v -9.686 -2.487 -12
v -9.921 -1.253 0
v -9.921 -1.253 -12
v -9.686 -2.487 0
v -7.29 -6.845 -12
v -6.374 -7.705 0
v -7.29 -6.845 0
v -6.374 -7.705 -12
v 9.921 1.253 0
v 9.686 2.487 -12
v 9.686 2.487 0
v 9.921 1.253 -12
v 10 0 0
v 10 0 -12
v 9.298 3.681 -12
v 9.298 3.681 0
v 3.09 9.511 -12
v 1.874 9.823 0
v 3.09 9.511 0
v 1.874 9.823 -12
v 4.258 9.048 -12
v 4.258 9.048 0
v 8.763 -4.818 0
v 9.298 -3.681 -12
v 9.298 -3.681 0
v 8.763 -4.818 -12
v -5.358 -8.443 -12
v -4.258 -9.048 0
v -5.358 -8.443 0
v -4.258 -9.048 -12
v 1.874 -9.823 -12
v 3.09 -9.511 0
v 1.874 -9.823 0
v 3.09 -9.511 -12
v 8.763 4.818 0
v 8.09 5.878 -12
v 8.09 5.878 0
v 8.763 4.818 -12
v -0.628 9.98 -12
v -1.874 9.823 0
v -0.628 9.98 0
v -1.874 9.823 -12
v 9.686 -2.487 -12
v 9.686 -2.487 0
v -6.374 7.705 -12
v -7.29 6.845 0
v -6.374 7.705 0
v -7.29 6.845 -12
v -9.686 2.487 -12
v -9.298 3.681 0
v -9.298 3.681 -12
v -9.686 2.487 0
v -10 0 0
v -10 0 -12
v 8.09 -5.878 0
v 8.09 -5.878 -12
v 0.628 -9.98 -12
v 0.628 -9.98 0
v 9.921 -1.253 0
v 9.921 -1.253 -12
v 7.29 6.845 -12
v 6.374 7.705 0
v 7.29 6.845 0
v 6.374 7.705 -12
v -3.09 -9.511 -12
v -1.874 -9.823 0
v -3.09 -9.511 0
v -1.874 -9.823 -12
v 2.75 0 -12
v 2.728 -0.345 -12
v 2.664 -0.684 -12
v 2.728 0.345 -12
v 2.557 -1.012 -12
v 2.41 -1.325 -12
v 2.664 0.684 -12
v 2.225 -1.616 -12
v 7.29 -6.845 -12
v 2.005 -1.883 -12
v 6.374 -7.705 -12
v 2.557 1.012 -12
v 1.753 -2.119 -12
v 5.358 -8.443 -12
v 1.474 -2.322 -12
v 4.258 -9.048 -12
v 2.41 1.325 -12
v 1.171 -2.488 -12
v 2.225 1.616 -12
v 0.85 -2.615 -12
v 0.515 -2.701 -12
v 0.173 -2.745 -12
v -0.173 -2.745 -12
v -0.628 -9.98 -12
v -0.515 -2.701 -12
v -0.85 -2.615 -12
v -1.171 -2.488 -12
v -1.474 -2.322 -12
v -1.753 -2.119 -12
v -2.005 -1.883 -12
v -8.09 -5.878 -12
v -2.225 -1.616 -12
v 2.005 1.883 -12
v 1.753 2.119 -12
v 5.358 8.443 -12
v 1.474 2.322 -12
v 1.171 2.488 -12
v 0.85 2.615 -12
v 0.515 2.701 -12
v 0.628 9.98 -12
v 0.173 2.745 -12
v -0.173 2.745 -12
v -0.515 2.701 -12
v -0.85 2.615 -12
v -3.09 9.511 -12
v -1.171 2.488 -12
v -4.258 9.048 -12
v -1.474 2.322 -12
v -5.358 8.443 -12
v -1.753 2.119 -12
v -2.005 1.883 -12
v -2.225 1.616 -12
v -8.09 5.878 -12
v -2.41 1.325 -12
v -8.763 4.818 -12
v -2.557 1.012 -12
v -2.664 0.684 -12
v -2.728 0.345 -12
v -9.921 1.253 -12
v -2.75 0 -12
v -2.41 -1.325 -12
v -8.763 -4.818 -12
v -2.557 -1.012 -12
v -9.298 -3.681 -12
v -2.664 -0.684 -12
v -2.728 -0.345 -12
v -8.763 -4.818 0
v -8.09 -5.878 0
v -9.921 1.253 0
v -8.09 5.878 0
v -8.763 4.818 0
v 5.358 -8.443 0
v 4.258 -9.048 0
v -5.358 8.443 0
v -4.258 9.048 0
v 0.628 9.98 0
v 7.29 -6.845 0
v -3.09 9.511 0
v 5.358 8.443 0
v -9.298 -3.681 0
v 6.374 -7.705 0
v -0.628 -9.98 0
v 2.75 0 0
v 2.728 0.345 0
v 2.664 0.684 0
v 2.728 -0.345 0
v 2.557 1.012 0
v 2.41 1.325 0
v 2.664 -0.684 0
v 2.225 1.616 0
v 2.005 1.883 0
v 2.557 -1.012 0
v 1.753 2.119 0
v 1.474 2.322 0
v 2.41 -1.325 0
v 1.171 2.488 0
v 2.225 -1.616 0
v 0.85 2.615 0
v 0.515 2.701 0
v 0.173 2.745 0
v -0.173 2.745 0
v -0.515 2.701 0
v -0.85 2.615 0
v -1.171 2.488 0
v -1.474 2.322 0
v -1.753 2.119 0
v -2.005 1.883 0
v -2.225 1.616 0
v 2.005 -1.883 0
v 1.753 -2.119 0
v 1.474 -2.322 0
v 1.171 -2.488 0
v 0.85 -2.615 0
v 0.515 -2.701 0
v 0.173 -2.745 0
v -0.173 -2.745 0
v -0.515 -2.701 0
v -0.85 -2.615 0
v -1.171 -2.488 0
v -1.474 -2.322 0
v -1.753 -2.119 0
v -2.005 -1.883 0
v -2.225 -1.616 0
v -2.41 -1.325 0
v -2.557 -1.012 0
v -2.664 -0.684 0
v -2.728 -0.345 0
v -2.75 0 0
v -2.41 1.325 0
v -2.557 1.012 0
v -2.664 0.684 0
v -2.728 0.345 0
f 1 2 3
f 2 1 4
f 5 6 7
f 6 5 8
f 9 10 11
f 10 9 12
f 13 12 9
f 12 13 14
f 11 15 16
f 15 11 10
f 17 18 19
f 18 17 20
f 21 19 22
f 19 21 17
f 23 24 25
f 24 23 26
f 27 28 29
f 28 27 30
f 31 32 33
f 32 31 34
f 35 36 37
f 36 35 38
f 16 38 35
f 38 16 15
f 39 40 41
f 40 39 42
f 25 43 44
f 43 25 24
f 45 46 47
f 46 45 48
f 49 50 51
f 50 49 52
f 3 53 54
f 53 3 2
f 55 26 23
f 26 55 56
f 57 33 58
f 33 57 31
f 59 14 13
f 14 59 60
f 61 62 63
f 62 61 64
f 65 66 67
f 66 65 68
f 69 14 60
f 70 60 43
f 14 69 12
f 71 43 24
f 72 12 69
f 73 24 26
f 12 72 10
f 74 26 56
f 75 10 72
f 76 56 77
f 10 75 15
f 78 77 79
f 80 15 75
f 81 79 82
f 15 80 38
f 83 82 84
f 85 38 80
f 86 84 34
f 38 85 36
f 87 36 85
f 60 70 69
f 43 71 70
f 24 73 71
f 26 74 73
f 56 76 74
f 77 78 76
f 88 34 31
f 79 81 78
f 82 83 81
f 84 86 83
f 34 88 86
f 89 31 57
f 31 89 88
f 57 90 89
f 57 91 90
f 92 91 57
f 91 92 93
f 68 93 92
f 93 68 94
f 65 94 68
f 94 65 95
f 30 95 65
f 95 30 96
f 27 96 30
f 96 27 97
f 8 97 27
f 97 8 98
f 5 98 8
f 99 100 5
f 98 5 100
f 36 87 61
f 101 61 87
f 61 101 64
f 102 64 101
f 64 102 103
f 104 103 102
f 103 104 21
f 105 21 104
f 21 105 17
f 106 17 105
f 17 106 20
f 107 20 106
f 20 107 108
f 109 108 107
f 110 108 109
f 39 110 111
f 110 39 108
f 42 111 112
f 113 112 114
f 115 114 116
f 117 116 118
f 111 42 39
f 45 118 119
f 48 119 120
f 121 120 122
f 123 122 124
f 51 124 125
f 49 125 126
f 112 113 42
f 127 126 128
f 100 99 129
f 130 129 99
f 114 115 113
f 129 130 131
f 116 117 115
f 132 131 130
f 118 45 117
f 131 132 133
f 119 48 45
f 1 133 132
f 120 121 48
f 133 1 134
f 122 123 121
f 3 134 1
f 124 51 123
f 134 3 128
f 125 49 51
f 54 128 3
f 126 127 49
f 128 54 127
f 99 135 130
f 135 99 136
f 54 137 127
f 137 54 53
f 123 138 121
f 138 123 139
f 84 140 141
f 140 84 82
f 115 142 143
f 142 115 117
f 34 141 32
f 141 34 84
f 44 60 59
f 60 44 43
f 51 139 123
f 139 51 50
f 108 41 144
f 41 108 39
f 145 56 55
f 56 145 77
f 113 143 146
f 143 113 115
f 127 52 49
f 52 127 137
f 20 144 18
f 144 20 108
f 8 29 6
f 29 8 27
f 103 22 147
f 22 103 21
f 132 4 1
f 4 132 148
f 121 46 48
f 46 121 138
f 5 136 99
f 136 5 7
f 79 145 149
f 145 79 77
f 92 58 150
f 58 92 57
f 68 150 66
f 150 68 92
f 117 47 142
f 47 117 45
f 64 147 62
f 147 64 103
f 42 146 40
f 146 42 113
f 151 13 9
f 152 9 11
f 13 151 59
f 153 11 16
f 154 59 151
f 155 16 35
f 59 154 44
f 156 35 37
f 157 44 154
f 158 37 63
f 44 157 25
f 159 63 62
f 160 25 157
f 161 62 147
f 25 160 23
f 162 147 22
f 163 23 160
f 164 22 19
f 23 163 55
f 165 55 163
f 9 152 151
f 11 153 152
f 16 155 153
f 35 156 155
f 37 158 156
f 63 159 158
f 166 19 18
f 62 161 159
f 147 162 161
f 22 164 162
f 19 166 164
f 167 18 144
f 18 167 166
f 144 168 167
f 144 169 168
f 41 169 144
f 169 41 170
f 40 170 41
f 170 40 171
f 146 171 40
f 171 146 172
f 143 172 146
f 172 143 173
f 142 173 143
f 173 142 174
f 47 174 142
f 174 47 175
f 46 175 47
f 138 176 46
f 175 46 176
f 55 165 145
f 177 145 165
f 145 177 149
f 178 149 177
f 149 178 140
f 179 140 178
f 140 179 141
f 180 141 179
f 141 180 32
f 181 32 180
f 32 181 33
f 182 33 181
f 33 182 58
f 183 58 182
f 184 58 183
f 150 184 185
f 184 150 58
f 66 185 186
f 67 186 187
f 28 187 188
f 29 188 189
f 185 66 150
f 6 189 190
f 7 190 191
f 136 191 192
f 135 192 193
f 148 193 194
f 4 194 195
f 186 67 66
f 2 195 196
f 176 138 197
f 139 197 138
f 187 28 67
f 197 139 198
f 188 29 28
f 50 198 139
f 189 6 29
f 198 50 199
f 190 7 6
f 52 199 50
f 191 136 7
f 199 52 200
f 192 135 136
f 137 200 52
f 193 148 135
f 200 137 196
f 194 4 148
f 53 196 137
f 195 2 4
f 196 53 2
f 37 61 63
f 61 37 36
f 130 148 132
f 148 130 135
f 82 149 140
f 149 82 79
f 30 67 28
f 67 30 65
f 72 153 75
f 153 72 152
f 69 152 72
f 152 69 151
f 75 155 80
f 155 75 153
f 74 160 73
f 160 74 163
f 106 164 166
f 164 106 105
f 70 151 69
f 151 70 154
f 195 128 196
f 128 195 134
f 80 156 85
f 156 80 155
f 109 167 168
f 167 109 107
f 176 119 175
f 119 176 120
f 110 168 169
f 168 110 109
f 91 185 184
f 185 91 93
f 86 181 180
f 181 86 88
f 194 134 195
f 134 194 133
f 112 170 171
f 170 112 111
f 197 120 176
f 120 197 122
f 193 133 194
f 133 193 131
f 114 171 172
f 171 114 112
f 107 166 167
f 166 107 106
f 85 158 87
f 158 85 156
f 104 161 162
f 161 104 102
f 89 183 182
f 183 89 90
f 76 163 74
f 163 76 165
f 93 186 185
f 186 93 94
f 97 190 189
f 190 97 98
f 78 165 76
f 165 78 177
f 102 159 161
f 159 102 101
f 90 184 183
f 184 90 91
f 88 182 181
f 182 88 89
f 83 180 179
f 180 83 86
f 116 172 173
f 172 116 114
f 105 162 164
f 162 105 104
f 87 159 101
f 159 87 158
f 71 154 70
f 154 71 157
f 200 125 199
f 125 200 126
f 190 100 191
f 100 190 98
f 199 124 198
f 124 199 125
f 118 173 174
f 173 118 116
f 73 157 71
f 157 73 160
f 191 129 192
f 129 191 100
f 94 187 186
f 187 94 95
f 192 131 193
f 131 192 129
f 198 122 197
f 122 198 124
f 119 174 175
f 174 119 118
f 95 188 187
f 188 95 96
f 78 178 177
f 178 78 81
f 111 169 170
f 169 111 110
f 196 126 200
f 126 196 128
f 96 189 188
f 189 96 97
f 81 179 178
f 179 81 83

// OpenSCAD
$fn = 50;


difference() {
	union() {
		translate(v = [0, 0, -12.0000000000]) {
			cylinder(h = 12, r = 10.0000000000);
		}
	}
	union() {
		#translate(v = [0, 0, -12]) {
			cylinder(h = 12, r = 2.7500000000);
		}
	}
}
